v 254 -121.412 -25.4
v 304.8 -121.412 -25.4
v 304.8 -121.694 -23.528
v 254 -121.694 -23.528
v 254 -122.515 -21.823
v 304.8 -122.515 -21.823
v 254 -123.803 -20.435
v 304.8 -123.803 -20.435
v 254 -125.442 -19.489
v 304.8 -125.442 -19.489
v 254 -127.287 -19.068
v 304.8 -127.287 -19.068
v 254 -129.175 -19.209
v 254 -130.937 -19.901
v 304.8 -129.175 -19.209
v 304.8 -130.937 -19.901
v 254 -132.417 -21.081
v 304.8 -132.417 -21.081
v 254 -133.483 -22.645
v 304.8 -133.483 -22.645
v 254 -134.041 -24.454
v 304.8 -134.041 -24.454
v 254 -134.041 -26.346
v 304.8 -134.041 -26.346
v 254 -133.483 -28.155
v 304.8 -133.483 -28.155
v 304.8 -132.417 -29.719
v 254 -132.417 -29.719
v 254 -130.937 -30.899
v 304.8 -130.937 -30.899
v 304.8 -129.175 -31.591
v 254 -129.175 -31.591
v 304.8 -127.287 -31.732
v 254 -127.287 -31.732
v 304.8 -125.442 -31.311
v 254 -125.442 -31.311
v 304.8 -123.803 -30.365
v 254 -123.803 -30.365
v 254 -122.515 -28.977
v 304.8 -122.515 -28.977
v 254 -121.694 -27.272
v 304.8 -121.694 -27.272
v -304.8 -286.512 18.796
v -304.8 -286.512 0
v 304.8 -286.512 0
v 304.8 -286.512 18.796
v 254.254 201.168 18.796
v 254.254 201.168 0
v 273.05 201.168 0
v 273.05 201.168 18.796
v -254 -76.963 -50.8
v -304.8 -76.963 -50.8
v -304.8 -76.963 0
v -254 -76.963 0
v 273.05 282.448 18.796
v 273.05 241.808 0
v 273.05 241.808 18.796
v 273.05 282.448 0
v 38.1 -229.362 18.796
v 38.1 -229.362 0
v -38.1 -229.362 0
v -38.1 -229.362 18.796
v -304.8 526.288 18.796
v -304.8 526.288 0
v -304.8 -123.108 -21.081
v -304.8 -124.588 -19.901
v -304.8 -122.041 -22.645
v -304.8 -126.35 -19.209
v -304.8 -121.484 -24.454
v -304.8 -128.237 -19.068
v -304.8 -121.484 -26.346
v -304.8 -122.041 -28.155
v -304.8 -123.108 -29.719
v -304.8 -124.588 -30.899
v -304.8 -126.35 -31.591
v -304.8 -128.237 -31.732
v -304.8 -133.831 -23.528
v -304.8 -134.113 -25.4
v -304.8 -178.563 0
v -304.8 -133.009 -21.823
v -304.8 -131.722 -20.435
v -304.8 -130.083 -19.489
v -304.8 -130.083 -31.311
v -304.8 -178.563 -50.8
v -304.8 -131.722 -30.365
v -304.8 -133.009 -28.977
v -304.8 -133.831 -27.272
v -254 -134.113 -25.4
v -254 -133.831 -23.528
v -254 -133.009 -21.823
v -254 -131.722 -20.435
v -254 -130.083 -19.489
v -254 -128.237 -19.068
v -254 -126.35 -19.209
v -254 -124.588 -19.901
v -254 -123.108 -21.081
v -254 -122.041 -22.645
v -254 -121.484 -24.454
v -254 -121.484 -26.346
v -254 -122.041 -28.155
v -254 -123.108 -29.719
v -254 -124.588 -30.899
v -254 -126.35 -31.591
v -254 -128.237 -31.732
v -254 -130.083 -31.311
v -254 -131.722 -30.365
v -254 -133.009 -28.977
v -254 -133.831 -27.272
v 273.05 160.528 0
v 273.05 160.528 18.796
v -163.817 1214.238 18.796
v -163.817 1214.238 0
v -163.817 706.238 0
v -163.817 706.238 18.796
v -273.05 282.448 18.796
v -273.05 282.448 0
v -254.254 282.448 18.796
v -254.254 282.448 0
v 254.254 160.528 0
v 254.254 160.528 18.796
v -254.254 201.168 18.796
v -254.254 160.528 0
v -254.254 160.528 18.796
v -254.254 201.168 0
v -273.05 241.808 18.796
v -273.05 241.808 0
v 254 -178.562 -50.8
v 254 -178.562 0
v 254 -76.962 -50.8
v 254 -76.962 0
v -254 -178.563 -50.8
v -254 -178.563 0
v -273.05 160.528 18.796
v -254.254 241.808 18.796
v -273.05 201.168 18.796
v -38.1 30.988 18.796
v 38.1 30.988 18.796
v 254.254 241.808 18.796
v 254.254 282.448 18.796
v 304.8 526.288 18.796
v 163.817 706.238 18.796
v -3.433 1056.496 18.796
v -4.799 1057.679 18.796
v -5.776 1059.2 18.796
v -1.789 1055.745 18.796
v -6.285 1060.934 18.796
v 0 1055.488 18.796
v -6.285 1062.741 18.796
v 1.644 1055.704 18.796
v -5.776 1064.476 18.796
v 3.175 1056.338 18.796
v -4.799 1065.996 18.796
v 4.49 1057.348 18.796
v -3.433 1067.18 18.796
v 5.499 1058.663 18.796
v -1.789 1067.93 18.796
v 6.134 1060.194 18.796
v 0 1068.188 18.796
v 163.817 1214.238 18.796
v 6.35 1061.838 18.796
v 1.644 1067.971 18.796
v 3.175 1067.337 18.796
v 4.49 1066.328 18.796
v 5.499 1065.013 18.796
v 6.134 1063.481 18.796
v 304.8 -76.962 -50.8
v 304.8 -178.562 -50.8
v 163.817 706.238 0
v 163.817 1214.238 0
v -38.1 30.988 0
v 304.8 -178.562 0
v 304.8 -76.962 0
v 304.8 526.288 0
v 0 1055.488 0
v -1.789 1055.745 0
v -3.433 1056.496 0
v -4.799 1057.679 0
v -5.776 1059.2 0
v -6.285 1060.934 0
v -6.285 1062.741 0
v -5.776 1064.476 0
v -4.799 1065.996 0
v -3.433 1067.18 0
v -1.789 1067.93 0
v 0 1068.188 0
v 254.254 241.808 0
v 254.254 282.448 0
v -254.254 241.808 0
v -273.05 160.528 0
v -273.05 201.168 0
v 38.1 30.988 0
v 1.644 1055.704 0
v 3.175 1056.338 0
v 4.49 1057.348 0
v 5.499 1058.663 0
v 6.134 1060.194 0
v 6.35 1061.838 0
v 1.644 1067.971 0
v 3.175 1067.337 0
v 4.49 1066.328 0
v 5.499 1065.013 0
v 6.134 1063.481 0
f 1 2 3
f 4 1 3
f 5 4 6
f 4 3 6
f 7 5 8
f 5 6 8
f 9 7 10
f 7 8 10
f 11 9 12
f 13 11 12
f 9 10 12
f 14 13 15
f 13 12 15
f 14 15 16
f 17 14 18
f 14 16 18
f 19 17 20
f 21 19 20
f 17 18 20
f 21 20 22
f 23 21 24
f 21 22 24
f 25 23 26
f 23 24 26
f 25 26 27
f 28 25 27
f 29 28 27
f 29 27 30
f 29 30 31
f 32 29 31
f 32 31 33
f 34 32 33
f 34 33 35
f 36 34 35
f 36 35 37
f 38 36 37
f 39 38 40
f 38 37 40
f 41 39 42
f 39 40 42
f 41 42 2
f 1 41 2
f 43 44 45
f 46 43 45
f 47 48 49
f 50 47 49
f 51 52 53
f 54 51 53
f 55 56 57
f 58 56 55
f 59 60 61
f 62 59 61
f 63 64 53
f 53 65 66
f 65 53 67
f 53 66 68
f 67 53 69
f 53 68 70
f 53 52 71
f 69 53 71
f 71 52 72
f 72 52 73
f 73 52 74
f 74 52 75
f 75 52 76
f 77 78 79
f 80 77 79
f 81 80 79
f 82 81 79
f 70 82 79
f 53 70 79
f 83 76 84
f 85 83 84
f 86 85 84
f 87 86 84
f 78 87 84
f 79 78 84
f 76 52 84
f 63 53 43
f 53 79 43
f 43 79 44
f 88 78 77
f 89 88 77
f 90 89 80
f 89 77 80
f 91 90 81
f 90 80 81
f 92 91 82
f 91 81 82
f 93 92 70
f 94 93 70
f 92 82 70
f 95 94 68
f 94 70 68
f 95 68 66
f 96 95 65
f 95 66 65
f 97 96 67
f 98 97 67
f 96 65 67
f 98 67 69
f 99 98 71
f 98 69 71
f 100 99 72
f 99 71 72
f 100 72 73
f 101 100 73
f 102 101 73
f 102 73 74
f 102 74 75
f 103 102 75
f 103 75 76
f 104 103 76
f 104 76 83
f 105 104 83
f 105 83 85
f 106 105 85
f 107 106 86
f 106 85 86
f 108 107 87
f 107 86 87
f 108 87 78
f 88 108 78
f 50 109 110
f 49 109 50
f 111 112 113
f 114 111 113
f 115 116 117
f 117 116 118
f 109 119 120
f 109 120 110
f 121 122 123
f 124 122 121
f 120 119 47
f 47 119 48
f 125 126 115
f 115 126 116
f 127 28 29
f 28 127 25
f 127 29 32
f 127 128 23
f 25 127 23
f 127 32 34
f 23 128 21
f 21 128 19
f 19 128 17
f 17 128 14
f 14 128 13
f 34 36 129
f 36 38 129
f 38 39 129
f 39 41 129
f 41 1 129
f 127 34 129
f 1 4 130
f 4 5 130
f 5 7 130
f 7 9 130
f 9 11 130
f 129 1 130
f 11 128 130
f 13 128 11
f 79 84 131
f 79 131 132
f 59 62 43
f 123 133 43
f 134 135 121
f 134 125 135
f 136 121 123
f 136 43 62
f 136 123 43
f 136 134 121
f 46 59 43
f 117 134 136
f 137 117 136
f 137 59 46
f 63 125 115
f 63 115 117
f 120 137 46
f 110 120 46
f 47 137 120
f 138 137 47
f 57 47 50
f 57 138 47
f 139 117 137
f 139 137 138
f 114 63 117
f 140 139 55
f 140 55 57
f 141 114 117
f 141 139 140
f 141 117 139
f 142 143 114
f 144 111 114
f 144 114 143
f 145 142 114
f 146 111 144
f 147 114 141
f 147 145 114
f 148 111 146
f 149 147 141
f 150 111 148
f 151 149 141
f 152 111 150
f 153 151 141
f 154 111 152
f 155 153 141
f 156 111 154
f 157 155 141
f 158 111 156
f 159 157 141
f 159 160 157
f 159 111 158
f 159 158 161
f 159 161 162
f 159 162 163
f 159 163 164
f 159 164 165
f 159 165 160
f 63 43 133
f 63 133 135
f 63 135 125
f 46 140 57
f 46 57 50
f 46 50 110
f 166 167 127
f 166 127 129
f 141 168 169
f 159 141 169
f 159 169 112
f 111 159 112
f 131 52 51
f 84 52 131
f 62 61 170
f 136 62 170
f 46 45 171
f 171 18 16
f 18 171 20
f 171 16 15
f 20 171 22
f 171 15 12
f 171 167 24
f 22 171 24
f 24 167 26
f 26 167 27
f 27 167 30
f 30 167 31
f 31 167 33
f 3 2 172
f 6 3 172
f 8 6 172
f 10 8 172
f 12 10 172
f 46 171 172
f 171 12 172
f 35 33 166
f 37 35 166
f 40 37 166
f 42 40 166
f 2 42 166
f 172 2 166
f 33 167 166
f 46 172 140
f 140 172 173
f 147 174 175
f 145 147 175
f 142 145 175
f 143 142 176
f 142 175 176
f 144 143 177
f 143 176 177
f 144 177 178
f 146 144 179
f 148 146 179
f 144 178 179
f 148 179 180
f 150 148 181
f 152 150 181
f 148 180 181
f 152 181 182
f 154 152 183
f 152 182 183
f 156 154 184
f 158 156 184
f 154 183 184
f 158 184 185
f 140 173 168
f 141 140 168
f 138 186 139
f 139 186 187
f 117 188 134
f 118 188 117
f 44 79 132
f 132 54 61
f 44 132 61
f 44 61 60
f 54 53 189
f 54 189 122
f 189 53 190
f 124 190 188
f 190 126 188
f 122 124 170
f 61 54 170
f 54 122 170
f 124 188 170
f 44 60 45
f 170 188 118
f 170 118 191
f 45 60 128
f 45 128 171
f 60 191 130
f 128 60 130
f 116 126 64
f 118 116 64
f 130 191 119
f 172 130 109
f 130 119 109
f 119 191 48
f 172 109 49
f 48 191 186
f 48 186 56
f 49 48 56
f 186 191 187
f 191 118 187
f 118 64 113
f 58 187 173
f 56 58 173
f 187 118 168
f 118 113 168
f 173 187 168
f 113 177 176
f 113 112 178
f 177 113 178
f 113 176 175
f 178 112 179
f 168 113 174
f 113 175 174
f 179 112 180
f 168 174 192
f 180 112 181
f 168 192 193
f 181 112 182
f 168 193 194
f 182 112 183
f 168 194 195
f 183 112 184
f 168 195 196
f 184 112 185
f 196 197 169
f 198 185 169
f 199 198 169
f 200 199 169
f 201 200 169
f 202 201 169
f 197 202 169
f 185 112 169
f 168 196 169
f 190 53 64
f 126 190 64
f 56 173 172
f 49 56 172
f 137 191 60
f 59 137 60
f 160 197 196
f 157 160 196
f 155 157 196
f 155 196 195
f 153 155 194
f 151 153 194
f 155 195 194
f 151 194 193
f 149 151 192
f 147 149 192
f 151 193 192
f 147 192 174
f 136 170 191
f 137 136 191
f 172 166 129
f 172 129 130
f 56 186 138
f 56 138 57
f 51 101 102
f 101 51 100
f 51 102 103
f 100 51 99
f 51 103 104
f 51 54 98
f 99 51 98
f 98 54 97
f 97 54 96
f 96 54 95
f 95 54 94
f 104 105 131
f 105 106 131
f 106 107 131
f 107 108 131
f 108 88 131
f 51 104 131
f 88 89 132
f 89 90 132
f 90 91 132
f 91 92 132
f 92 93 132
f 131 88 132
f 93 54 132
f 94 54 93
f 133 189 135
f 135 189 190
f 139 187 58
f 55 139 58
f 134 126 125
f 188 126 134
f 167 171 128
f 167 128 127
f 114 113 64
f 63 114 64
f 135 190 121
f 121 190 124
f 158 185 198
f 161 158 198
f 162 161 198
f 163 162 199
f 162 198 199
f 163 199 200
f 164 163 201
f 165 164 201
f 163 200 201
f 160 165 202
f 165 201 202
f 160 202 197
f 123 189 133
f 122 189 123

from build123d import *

# Parameters (mm, degrees)
F0_W     = 18.796
F0_H     = 40.64
F1_DEPTH = 18.796
F2_R     = 6.35
F3_DEPTH = 50.8
F4_W     = 101.6
F4_H     = 50.8
F4_R     = 6.35
F5_DEPTH = 50.8


# Not quite as in the source:
# - a feature names something its author has since deleted; it is built from what else it names


with BuildPart() as f1:
    # F0 (on Top) → F1 (new body)
    with BuildSketch(Plane.XY):
        Polygon((-163.8174757903, 706.2376797943), (-304.8, 526.2879983068), (-304.8, 30.9879983068), (-304.8, -286.5120016932), (304.8, -286.5120016932), (304.8, 30.9879983068), (304.8, 526.2879983068), (163.8174757903, 706.2376797943), (163.8174757903, 1214.2376797943), (-163.8174757903, 1214.2376797943), align=None)
        with Locations((-263.652, 180.8479983068)):
            Rectangle(F0_W, F0_H, mode=Mode.SUBTRACT)
        with Locations((-263.652, 262.1279983068)):
            Rectangle(F0_W, F0_H, mode=Mode.SUBTRACT)
        Polygon((38.1, 30.9879983068), (38.1, -229.3620016932), (-38.1, -229.3620016932), (-38.1, 30.9879983068), (0, 30.9879983068), align=None, mode=Mode.SUBTRACT)
        with Locations((263.652, 180.8479983068)):
            Rectangle(F0_W, F0_H, mode=Mode.SUBTRACT)
        with Locations((263.652, 262.1279983068)):
            Rectangle(F0_W, F0_H, mode=Mode.SUBTRACT)
        with BuildLine():
            ThreePointArc((0, 1055.4876797943), (-6.35, 1061.8376797943), (0, 1068.1876797943))
            ThreePointArc((0, 1068.1876797943), (4.4901280605, 1066.3278078548), (6.35, 1061.8376797943))
            ThreePointArc((6.35, 1061.8376797943), (4.4901280605, 1057.3475517337), (0, 1055.4876797943))
        make_face(mode=Mode.SUBTRACT)
    extrude(amount=F1_DEPTH)

    # F2 (on face) → F3 (join)
    with BuildSketch(Plane.YZ.offset(304.8)):
        Polygon((-127.7620016932, 0), (-178.5620016932, 0), (-178.5620016932, -50.8), (-127.7620016932, -50.8), (-76.9620016932, -50.8), (-76.9620016932, 0), align=None)
        with Locations((-127.7620016932, -25.4)):
            Circle(F2_R, mode=Mode.SUBTRACT)
    extrude(amount=-F3_DEPTH)

    # F4 (on face) → F5 (join)
    with BuildSketch(Plane(origin=(-304.8, 0, 0), x_dir=(0, -1, 0), z_dir=(-1, 0, 0))):
        with Locations((127.7626349211, -25.4)):
            Rectangle(F4_W, F4_H)
        with Locations((127.7626349211, -25.4)):
            Circle(F4_R, mode=Mode.SUBTRACT)
    extrude(amount=-F5_DEPTH)


solid = f1.part
